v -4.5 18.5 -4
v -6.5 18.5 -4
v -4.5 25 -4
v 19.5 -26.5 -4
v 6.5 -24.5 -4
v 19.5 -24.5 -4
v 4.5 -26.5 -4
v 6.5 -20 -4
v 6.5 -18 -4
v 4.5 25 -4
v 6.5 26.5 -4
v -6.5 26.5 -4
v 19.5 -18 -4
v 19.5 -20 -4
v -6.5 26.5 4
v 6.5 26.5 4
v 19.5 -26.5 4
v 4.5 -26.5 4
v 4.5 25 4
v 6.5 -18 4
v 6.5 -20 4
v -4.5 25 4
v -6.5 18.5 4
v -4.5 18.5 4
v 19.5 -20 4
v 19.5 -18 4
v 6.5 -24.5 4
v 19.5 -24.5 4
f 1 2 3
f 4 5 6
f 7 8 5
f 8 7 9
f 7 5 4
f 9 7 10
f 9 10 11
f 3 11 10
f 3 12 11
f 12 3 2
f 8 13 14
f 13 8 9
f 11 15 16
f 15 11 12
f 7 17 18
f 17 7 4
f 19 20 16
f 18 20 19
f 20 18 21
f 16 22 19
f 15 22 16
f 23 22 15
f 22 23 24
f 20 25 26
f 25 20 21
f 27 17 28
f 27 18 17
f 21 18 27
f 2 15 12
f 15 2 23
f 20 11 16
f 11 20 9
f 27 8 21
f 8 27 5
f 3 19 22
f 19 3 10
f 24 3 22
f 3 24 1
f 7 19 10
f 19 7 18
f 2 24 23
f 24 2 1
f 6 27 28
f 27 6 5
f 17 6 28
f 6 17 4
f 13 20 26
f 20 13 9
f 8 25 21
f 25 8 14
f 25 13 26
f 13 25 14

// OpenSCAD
$fn=100;
clip_width=12;
clip_width=8;
clip_height=53;
clip_back_height=7;
grab_height=6.5;
grab_depth=13;
clip_depth=13;
thickness=2;
fiddle=1;

module clip_back() {
    difference() {
        cube([clip_width, clip_depth, clip_height], center=true);
        translate([0, 0, -thickness/2]) {
            cube([clip_width+2*fiddle, 
                clip_depth-2*thickness, 
                clip_height-thickness+fiddle], 
                center=true);
        }
        translate([0, thickness+fiddle, -clip_back_height]) {
            cube([clip_width+2*fiddle, 
                clip_depth-2*thickness, 
                clip_height-thickness], 
                center=true);
        }
    }
}

module clip_grabber() {
    translate([0, -clip_depth, -clip_height/2+thickness/2]) {
        cube([clip_width, grab_depth, thickness], center=true);
    }
    translate([0, -clip_depth, -clip_height/2+thickness/2+grab_height]) {
        cube([clip_width, grab_depth, thickness], center=true);
    }
}

module clip() {
    clip_back();
    clip_grabber();
}

spacing = 15;

//offsets = [0*spacing, 1*spacing, 2*spacing, 3*spacing];
offsets = [0];

for (offset = offsets) {
  translate([offset, 0, 0])
        rotate([0, 90, 90]) clip();
}
